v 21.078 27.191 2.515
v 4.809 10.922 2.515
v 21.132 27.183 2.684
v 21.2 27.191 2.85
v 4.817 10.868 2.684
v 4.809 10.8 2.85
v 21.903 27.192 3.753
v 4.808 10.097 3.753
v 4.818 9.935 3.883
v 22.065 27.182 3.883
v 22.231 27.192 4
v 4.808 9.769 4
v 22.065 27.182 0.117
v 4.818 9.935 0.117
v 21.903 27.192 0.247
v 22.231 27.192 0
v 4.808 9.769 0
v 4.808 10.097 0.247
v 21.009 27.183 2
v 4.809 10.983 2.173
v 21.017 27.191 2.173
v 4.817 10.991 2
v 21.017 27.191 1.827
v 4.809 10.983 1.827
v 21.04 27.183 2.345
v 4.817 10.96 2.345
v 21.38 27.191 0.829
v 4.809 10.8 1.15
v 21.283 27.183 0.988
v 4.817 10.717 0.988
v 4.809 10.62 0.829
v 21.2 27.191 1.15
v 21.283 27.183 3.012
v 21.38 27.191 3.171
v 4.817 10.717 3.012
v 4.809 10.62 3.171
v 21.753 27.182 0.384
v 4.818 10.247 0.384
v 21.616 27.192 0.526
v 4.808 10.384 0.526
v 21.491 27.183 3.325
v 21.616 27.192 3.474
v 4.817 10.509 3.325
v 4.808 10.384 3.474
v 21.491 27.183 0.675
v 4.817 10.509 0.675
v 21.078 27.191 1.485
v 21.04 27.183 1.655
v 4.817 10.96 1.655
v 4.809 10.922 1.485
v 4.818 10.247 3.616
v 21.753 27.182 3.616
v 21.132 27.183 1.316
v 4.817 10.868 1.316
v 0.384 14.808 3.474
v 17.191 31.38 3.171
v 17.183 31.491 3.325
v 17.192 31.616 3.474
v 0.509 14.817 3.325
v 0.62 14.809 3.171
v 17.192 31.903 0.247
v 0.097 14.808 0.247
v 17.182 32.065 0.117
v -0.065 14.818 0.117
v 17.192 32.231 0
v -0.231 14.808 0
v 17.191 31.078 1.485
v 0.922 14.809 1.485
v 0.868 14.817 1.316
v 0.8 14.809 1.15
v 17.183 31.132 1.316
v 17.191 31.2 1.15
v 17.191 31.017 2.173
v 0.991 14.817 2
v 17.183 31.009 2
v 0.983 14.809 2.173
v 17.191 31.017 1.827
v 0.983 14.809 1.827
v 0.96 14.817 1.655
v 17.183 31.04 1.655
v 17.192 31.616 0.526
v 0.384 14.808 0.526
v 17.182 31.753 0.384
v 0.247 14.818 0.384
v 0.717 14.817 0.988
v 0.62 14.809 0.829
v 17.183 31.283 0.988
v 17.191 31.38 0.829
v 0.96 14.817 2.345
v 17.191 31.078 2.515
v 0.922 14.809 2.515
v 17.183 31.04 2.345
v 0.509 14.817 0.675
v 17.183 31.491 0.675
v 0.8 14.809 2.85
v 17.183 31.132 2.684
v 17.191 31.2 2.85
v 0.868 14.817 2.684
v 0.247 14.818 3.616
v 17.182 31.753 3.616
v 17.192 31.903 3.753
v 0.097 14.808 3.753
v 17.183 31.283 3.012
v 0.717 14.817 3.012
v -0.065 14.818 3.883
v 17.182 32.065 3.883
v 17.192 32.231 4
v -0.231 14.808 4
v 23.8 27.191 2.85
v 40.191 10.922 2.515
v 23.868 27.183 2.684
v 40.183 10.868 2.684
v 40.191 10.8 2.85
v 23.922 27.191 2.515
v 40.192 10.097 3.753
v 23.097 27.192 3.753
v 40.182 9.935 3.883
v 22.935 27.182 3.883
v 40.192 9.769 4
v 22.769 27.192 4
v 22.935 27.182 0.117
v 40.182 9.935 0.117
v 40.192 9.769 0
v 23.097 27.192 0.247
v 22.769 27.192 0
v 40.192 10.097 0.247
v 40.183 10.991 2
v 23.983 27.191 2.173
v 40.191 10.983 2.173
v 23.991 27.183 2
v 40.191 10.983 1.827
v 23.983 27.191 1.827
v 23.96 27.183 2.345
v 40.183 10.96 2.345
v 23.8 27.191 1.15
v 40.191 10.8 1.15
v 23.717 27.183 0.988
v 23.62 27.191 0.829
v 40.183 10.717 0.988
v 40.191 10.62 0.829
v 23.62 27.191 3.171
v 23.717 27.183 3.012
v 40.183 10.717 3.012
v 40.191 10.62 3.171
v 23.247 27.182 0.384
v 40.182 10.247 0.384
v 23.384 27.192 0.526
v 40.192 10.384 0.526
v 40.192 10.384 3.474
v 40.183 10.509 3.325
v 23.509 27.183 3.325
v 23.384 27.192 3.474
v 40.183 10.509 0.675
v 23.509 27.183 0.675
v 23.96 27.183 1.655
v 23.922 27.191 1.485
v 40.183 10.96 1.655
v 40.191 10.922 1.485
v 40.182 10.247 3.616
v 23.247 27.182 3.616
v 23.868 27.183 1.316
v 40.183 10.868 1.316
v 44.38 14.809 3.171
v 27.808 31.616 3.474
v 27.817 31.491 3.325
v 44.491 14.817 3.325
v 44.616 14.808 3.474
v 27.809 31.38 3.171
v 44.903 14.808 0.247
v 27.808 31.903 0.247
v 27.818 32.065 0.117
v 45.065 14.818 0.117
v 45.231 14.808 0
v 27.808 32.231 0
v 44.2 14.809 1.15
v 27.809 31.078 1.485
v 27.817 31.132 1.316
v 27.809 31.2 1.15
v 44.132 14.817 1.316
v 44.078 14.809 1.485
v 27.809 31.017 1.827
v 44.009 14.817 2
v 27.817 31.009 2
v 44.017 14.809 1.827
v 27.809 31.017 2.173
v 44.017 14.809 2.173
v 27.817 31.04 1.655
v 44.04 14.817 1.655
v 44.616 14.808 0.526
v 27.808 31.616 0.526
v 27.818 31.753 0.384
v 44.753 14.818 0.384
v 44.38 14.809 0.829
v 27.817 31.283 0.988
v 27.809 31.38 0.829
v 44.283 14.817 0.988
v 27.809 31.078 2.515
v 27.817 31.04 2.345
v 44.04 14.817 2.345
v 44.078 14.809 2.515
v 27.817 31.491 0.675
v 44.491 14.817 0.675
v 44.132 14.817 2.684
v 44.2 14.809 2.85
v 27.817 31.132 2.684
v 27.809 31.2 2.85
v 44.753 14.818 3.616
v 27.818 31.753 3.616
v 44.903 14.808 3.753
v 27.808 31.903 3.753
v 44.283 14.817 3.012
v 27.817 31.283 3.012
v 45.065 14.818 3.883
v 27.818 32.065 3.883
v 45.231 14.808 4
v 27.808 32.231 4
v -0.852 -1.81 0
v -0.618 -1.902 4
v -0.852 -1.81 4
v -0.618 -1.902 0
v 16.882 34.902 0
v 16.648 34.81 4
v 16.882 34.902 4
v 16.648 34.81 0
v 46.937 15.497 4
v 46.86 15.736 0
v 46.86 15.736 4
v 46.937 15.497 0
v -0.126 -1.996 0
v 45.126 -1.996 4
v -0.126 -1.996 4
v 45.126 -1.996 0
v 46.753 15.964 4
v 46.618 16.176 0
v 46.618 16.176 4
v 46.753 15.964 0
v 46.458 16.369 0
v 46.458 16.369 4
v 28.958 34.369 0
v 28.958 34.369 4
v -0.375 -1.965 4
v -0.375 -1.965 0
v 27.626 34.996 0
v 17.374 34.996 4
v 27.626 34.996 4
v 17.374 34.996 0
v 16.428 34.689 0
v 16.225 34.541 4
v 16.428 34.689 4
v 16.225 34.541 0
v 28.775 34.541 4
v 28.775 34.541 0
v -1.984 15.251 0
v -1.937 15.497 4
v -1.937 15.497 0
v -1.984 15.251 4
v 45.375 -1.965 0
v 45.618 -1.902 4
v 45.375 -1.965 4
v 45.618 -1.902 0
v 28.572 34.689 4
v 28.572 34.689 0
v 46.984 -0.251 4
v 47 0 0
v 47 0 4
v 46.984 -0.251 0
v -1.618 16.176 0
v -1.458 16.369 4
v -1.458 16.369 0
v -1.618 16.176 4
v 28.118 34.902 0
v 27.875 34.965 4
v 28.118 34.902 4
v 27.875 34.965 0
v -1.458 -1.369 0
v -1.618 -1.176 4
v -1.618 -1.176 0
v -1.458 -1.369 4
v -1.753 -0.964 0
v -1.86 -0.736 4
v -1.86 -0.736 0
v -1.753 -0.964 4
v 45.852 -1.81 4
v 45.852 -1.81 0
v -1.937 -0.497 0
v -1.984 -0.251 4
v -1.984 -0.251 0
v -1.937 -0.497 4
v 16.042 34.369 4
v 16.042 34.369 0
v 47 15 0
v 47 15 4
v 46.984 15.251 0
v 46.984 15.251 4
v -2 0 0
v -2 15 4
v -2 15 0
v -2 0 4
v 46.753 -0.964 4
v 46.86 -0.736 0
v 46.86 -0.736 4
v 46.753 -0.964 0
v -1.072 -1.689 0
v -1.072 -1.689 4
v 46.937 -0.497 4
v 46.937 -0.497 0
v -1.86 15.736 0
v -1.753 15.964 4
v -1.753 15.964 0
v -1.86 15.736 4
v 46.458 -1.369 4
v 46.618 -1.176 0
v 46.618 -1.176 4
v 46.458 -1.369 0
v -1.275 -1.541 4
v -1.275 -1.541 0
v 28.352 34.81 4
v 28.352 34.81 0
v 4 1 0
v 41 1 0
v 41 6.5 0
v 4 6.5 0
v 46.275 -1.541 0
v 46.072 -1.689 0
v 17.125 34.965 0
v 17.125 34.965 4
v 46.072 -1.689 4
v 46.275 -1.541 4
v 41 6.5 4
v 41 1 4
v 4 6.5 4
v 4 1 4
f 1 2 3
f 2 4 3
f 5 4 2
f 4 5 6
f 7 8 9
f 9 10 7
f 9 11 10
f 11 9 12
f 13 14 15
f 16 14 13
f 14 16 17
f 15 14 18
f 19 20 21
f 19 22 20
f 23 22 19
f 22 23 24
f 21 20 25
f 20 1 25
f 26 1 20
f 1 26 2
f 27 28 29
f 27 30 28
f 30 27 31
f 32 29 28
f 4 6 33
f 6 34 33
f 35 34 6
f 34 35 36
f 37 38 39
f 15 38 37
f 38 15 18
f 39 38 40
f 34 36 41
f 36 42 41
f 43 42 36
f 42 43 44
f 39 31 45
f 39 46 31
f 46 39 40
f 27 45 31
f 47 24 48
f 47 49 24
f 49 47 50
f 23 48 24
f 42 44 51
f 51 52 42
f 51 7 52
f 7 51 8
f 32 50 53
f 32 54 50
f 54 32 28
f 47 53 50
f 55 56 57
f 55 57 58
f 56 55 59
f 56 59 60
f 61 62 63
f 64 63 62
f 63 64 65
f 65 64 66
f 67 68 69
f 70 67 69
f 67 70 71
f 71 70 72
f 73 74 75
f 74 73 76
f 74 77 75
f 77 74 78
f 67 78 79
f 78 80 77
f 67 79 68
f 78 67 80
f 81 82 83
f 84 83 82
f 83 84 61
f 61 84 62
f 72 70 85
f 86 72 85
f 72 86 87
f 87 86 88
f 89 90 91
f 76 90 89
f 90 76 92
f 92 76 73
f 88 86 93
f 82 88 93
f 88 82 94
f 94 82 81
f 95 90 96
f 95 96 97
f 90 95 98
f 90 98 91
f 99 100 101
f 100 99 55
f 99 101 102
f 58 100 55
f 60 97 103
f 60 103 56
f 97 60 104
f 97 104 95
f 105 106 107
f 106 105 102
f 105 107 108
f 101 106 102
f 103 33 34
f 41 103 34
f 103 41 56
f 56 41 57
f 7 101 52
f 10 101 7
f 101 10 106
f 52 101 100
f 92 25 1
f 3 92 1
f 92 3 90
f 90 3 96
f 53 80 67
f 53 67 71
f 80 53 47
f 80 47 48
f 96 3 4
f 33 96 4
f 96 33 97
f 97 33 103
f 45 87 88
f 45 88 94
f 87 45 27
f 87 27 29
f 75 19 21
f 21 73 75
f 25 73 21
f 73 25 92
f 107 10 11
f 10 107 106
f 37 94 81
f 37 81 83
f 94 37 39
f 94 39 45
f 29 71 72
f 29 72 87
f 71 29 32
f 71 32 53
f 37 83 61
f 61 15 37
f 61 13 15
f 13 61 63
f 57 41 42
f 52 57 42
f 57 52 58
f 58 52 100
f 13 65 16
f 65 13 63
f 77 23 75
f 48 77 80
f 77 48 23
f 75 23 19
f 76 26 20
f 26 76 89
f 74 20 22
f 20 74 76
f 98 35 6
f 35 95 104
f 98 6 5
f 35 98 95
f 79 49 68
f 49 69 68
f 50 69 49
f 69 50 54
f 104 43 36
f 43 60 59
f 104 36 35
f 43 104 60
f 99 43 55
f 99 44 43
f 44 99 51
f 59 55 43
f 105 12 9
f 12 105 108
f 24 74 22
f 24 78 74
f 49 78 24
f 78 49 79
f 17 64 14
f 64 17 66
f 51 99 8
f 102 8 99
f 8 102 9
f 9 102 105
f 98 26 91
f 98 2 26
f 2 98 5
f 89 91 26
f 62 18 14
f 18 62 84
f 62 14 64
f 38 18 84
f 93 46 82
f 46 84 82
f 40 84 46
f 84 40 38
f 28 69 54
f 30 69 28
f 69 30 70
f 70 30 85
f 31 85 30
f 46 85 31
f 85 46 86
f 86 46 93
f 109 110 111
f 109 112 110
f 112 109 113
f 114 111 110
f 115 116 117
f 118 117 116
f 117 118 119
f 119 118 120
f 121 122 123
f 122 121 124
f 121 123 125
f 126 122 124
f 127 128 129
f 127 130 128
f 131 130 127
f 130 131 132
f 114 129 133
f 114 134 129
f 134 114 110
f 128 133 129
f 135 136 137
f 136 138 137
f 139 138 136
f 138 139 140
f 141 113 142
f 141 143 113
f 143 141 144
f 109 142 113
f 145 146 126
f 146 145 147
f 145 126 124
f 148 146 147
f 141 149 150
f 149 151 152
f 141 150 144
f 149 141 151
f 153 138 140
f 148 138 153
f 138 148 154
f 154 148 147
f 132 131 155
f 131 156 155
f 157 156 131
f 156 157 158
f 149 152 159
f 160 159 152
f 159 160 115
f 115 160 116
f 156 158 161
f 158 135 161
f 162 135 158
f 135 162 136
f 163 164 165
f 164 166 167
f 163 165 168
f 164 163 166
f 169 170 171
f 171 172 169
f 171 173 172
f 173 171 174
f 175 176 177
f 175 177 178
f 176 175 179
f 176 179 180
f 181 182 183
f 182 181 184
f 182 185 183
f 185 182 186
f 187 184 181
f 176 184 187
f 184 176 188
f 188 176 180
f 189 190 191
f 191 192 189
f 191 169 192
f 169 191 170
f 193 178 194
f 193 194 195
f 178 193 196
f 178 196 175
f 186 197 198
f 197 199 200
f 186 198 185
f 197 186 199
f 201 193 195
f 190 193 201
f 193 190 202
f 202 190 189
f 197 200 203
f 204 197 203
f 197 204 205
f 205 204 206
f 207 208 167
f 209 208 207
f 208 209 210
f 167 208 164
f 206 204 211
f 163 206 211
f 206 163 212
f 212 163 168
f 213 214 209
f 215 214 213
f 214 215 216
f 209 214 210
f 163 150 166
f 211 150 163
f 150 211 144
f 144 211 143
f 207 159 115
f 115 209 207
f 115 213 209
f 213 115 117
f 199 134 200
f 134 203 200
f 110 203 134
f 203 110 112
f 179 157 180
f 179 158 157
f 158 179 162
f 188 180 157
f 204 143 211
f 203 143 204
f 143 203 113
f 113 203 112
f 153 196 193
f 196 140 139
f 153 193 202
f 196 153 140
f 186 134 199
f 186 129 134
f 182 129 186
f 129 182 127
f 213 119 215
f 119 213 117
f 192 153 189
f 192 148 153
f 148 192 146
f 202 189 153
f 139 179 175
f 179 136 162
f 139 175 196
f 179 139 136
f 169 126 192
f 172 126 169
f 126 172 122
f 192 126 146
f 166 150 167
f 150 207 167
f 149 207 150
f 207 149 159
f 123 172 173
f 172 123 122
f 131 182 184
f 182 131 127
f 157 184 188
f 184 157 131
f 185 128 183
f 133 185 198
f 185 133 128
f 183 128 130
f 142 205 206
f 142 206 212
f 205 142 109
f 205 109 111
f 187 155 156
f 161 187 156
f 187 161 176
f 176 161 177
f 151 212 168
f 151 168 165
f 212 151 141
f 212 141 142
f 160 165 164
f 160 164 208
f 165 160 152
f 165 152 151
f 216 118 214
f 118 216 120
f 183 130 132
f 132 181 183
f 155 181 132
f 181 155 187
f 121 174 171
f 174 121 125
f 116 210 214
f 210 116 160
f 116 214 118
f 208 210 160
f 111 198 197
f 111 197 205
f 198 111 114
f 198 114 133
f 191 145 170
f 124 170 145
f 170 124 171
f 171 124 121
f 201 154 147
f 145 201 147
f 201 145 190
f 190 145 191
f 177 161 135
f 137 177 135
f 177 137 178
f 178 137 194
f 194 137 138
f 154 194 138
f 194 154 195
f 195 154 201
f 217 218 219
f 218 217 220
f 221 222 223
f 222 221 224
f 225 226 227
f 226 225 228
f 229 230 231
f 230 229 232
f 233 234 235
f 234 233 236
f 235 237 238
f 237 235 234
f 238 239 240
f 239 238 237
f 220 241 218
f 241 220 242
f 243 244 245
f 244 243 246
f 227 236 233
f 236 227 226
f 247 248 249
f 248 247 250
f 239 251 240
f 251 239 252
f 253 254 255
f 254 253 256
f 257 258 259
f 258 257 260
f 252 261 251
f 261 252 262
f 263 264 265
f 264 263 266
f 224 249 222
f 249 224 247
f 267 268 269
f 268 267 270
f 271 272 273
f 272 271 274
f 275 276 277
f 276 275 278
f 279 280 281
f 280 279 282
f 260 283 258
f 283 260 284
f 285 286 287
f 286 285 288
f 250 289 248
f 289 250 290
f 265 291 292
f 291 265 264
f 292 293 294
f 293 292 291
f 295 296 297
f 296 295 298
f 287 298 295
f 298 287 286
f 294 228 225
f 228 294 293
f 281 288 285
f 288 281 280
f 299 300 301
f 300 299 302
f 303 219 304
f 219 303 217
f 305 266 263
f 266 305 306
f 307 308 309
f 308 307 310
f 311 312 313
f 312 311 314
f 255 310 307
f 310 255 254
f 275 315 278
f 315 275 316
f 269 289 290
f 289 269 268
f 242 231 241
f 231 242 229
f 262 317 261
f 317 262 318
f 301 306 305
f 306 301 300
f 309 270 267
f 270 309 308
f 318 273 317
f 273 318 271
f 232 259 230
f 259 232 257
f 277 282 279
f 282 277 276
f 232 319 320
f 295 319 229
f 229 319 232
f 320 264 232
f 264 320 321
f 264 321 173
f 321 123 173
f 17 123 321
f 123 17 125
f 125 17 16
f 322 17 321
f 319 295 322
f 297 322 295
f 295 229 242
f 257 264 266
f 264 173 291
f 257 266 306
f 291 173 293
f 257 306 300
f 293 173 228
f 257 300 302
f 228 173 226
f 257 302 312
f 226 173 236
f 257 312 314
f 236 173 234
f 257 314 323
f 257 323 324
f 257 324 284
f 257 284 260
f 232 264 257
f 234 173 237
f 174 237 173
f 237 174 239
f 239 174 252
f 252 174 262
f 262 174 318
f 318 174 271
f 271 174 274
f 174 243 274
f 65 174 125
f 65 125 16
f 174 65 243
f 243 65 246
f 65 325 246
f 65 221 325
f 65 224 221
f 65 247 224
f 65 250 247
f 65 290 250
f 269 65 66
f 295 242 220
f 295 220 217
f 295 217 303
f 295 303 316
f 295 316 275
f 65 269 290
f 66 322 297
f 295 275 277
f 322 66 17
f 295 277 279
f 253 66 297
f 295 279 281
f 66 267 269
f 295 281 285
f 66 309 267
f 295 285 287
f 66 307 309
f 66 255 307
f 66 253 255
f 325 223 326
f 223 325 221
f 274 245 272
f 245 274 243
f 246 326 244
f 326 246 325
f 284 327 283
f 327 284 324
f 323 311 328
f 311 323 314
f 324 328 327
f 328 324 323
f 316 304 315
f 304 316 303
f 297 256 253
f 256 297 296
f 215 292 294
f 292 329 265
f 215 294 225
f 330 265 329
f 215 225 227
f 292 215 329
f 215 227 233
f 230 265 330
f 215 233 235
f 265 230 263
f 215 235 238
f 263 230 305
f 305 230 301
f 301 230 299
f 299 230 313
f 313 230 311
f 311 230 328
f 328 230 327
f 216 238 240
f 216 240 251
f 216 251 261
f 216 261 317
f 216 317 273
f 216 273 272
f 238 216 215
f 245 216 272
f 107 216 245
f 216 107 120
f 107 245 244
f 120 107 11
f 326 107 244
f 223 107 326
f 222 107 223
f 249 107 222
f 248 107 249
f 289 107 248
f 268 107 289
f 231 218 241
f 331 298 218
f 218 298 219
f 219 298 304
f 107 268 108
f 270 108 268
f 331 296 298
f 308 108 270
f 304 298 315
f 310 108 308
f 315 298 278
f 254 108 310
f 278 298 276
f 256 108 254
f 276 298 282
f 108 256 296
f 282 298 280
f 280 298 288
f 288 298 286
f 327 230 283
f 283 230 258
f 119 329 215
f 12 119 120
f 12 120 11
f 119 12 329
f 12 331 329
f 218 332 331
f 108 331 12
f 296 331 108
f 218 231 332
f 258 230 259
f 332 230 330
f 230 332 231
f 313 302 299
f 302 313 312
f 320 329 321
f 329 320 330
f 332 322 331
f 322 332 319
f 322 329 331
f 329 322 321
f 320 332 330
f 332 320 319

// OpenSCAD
use<Write/Write.scad>

$fn=50;

module base() {
	r=2;
	h=4;
	hull() {
		translate([0,0,0])   cylinder(h=h, r=r);
		translate([45,0,0])  cylinder(h=h, r=r);
		translate([45,15,0]) cylinder(h=h, r=r);
		translate([27.5,33,0]) cylinder(h=h, r=r);
		translate([17.5,33,0]) cylinder(h=h, r=r);
		translate([0,15,0])  cylinder(h=h, r=r);
		}
}

module mount() {
	difference() {
		base();
		translate([(45/2)-(37/2),1,-1]) cube([37,5.5,6]);
		translate([11,21,2]) rotate([0,0,45])  nice_cube(); //cube([23,5.5,6], center=true);
		translate([34,21,2]) rotate([0,0,-45]) nice_cube(); //cube([23,5.5,6], center=true);
	}
}

difference() {
	mount();
	translate([15,15,3]) write("GoPro", h=4, t=1.2, font="Write/Letters.dxf", space=1.1);
	translate([7,10,3]) write("flycode.pl", h=4, t=1.2, font="Write/Letters.dxf", space=1.1);
}

module nice_cube() {
	difference() {
	cube([26,8,8], center=true);
	translate([0,-5.45,0]) rotate([0,90,0]) cylinder(h=26, r=5.5/2, center=true);
	translate([0,5.45,0]) rotate([0,90,0]) cylinder(h=26, r=5.5/2, center=true);
	translate([26/2+1.2,0,0]) rotate([90,0,0]) cylinder(h=26, r=5.5/2, center=true);
	translate([-(26/2+1.2),0,0]) rotate([90,0,0]) cylinder(h=26, r=5.5/2, center=true);
}
}
